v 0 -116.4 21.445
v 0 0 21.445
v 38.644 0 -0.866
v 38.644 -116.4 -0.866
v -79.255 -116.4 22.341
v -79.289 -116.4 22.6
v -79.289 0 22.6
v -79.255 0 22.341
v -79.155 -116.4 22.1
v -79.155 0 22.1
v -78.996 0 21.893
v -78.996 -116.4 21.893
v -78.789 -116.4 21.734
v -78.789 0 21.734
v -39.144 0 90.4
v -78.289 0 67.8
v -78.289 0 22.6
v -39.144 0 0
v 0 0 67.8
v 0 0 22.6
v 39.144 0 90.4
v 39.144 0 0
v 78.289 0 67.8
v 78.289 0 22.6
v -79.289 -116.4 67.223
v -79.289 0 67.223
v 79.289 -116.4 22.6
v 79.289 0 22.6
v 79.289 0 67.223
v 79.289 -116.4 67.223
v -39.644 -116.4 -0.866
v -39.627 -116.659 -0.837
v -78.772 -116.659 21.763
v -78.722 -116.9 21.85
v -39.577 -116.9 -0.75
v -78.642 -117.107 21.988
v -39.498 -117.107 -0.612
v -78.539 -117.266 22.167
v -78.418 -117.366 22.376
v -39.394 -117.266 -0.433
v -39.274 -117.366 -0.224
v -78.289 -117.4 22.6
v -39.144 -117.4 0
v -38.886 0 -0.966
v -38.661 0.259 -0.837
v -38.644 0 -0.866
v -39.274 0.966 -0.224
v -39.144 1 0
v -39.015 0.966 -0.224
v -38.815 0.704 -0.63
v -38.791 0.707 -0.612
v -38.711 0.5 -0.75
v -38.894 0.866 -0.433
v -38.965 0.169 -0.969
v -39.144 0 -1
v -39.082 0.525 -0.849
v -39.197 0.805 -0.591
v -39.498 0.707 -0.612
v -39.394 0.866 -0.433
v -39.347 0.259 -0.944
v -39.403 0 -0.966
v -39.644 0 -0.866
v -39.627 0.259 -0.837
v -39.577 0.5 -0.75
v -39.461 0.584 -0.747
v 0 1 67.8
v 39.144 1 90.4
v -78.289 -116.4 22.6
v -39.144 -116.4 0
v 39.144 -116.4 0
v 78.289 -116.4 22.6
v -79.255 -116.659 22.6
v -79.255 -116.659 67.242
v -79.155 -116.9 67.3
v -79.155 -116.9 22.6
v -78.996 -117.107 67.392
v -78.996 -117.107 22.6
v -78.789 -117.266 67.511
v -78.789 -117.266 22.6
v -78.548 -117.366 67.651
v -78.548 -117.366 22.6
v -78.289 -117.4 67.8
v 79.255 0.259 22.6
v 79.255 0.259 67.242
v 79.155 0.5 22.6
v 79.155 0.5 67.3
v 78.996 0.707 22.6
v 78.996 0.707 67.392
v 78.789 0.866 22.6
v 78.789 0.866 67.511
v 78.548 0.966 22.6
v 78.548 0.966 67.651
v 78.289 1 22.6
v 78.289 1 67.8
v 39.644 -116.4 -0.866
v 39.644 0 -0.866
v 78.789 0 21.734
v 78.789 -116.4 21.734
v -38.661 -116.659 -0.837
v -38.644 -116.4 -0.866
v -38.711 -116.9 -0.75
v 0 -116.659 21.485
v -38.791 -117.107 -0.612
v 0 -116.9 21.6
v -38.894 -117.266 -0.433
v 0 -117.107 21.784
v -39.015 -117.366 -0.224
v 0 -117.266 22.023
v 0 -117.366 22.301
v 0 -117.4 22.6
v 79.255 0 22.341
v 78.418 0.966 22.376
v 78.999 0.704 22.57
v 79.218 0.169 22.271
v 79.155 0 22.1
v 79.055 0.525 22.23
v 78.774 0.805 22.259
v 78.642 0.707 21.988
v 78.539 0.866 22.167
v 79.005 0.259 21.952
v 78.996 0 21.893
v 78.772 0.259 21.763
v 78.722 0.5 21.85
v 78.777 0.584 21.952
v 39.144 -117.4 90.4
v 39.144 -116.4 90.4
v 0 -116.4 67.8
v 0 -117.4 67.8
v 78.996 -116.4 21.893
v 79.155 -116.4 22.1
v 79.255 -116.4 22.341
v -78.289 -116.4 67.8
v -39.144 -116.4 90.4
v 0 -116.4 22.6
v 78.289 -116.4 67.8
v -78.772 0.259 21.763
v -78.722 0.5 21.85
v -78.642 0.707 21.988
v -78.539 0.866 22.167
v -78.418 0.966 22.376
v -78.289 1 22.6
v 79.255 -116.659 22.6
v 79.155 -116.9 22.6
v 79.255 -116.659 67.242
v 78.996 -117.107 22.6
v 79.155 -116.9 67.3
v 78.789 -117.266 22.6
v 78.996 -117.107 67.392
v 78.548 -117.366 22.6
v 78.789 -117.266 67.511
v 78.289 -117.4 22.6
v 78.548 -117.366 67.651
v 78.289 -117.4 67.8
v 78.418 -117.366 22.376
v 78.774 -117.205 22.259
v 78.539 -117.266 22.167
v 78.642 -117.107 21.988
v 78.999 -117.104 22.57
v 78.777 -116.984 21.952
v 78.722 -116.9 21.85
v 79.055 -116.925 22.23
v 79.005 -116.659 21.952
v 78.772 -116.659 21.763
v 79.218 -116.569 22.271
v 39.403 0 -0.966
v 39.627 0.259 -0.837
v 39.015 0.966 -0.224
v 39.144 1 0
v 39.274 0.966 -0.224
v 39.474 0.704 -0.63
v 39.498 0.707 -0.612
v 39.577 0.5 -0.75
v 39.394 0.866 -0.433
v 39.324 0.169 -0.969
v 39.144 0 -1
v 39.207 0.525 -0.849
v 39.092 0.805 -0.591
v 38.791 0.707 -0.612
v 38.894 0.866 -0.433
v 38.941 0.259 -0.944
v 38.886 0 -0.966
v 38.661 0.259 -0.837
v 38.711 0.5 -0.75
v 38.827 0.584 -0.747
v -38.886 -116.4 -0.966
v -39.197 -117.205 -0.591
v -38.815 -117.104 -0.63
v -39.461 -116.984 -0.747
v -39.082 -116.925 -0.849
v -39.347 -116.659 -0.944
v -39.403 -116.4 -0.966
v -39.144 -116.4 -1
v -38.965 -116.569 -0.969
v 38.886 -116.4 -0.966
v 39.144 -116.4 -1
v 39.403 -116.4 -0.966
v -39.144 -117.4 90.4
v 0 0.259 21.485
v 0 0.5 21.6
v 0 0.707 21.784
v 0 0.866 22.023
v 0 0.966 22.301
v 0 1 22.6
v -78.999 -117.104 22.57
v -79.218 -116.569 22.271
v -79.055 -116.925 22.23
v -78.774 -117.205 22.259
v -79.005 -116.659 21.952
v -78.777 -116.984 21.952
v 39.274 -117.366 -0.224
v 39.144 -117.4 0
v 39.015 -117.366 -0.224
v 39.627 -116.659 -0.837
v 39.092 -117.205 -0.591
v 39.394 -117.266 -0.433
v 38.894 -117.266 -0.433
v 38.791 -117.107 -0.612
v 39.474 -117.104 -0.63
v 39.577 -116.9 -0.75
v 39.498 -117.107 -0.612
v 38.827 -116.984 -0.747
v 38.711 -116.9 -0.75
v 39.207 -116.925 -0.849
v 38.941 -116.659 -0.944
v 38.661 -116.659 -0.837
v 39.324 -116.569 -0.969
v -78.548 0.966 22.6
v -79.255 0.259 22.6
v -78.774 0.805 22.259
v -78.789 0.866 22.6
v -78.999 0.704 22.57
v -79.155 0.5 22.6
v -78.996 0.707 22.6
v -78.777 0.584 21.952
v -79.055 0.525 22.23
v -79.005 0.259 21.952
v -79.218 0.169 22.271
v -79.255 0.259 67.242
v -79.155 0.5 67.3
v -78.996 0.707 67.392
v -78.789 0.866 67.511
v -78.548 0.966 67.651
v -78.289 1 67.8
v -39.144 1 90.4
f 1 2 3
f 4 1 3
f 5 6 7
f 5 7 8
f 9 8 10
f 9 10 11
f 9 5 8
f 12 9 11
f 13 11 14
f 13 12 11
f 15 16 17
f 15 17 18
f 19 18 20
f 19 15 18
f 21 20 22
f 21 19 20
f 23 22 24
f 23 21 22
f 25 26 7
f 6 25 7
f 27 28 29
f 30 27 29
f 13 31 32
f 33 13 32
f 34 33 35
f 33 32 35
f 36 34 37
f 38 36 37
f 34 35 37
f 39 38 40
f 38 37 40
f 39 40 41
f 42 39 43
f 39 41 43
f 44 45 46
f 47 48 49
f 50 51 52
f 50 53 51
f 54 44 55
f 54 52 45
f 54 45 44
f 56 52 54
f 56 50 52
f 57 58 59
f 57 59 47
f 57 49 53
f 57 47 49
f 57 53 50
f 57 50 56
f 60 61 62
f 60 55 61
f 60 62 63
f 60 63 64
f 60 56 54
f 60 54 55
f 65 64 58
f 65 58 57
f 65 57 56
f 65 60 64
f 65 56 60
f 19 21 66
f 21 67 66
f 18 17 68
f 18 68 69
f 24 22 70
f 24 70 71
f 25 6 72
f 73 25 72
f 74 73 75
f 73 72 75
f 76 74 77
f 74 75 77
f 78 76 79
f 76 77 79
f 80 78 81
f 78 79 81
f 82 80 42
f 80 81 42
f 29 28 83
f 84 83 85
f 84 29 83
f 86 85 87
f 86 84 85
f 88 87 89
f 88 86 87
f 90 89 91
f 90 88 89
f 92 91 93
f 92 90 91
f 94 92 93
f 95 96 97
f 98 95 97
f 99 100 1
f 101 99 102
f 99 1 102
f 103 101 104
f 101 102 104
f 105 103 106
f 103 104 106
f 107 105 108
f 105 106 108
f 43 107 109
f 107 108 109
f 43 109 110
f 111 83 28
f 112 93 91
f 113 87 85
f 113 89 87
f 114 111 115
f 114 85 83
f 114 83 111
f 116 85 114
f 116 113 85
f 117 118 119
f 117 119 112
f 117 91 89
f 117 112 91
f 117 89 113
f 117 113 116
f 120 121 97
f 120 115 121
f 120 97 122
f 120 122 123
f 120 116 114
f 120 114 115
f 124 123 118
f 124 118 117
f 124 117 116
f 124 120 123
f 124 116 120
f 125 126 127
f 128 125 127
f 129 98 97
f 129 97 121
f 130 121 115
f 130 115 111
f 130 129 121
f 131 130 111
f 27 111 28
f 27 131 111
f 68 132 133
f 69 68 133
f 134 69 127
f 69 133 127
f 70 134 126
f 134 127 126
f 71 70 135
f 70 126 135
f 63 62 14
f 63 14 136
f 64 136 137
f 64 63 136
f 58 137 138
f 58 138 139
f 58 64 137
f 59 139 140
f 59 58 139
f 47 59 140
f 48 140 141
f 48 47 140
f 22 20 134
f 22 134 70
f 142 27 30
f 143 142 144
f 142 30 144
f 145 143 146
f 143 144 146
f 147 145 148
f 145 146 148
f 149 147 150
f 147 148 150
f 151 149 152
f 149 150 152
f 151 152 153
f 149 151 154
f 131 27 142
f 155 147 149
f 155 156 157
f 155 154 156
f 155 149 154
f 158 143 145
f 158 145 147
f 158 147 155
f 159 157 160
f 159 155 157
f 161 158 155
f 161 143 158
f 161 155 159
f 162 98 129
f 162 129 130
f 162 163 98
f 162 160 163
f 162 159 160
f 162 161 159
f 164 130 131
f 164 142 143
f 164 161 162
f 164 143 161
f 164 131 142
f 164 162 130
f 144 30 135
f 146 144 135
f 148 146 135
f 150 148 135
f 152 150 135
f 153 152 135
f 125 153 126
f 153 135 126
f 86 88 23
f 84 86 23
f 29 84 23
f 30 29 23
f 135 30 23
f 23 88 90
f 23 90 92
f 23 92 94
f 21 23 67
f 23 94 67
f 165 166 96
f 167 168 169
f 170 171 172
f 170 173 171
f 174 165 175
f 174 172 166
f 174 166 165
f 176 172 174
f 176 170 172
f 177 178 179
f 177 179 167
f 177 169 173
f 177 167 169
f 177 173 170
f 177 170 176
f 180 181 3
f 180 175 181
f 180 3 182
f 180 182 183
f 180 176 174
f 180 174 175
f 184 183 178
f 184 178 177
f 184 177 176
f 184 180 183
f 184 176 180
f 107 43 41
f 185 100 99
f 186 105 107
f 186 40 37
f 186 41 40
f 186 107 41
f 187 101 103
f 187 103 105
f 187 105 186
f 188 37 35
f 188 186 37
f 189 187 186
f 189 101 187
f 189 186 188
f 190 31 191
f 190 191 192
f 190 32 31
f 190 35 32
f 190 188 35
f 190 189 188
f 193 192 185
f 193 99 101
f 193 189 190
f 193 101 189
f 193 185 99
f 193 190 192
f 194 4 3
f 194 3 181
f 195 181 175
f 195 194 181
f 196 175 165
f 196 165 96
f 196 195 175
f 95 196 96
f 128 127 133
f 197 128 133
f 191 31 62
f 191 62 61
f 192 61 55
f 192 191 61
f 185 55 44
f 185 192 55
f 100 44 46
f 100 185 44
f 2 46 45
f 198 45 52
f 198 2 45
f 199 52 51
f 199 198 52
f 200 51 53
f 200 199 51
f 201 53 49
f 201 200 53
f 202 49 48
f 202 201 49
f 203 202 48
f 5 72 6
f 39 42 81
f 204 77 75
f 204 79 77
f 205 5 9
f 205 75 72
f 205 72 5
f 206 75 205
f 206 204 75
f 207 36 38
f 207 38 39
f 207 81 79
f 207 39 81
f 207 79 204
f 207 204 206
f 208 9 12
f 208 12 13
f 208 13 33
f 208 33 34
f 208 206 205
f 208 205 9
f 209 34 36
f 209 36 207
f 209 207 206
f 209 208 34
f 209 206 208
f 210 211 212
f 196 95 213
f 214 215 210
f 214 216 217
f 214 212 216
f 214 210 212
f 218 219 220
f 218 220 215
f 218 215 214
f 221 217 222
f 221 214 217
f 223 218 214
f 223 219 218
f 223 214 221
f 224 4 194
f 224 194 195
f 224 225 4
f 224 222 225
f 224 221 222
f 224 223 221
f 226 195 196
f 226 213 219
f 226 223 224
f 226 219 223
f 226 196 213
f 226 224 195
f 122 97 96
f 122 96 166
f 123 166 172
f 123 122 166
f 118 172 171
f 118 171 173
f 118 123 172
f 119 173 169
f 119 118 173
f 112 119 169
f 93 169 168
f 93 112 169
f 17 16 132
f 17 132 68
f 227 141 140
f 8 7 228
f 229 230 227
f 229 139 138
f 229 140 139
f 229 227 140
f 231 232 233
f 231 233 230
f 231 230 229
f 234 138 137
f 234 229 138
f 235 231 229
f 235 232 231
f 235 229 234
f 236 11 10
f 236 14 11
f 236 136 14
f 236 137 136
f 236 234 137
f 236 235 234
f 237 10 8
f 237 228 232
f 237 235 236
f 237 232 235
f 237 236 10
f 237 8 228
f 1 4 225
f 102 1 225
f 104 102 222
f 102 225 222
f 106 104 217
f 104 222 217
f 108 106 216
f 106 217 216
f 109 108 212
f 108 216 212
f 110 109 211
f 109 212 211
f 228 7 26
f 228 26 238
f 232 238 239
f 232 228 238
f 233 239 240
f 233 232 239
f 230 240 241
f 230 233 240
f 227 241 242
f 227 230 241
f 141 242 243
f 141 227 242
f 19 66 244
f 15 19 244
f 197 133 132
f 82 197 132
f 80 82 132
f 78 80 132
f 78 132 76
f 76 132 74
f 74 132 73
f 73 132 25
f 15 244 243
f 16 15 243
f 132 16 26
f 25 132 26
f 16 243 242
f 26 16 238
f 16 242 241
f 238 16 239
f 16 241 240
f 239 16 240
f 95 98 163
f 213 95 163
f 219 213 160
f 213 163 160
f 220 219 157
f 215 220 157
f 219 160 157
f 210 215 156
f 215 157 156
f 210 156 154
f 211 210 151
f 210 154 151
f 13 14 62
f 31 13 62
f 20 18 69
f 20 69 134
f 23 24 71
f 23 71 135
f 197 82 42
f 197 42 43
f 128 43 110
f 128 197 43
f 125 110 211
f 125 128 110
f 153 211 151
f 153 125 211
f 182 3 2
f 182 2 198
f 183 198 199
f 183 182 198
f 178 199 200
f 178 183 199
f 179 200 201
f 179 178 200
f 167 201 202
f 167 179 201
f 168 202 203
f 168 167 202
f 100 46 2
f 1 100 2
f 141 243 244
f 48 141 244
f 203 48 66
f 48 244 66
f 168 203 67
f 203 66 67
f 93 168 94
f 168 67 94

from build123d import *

# Parameters (mm, degrees)
PAD001_DEPTH = 116.4
THICKNESS_T  = 1


with BuildPart() as part:
    # Sketch001 → Pad001 (new body)
    with BuildSketch(Plane.XZ):
        Polygon((0, 67.8), (-39.144348, 90.4), (-78.288697, 67.8), (-78.288697, 22.6), (-39.144348, 0), (0, 22.6), (39.144348, 0), (78.288697, 22.6), (78.288697, 67.8), (39.144348, 90.4), align=None)
    extrude(amount=PAD001_DEPTH)

    # Thickness
    thickness_openings = [part.faces().sort_by_distance(p)[0] for p in [
        (58.716522, -58.2, 79.1),
        (-19.572174, -58.2, 79.1),
        (19.572174, -58.2, 79.1),
        (-58.716522, -58.2, 79.1),
    ]]
    offset(amount=THICKNESS_T, openings=thickness_openings)


solid = part.part
